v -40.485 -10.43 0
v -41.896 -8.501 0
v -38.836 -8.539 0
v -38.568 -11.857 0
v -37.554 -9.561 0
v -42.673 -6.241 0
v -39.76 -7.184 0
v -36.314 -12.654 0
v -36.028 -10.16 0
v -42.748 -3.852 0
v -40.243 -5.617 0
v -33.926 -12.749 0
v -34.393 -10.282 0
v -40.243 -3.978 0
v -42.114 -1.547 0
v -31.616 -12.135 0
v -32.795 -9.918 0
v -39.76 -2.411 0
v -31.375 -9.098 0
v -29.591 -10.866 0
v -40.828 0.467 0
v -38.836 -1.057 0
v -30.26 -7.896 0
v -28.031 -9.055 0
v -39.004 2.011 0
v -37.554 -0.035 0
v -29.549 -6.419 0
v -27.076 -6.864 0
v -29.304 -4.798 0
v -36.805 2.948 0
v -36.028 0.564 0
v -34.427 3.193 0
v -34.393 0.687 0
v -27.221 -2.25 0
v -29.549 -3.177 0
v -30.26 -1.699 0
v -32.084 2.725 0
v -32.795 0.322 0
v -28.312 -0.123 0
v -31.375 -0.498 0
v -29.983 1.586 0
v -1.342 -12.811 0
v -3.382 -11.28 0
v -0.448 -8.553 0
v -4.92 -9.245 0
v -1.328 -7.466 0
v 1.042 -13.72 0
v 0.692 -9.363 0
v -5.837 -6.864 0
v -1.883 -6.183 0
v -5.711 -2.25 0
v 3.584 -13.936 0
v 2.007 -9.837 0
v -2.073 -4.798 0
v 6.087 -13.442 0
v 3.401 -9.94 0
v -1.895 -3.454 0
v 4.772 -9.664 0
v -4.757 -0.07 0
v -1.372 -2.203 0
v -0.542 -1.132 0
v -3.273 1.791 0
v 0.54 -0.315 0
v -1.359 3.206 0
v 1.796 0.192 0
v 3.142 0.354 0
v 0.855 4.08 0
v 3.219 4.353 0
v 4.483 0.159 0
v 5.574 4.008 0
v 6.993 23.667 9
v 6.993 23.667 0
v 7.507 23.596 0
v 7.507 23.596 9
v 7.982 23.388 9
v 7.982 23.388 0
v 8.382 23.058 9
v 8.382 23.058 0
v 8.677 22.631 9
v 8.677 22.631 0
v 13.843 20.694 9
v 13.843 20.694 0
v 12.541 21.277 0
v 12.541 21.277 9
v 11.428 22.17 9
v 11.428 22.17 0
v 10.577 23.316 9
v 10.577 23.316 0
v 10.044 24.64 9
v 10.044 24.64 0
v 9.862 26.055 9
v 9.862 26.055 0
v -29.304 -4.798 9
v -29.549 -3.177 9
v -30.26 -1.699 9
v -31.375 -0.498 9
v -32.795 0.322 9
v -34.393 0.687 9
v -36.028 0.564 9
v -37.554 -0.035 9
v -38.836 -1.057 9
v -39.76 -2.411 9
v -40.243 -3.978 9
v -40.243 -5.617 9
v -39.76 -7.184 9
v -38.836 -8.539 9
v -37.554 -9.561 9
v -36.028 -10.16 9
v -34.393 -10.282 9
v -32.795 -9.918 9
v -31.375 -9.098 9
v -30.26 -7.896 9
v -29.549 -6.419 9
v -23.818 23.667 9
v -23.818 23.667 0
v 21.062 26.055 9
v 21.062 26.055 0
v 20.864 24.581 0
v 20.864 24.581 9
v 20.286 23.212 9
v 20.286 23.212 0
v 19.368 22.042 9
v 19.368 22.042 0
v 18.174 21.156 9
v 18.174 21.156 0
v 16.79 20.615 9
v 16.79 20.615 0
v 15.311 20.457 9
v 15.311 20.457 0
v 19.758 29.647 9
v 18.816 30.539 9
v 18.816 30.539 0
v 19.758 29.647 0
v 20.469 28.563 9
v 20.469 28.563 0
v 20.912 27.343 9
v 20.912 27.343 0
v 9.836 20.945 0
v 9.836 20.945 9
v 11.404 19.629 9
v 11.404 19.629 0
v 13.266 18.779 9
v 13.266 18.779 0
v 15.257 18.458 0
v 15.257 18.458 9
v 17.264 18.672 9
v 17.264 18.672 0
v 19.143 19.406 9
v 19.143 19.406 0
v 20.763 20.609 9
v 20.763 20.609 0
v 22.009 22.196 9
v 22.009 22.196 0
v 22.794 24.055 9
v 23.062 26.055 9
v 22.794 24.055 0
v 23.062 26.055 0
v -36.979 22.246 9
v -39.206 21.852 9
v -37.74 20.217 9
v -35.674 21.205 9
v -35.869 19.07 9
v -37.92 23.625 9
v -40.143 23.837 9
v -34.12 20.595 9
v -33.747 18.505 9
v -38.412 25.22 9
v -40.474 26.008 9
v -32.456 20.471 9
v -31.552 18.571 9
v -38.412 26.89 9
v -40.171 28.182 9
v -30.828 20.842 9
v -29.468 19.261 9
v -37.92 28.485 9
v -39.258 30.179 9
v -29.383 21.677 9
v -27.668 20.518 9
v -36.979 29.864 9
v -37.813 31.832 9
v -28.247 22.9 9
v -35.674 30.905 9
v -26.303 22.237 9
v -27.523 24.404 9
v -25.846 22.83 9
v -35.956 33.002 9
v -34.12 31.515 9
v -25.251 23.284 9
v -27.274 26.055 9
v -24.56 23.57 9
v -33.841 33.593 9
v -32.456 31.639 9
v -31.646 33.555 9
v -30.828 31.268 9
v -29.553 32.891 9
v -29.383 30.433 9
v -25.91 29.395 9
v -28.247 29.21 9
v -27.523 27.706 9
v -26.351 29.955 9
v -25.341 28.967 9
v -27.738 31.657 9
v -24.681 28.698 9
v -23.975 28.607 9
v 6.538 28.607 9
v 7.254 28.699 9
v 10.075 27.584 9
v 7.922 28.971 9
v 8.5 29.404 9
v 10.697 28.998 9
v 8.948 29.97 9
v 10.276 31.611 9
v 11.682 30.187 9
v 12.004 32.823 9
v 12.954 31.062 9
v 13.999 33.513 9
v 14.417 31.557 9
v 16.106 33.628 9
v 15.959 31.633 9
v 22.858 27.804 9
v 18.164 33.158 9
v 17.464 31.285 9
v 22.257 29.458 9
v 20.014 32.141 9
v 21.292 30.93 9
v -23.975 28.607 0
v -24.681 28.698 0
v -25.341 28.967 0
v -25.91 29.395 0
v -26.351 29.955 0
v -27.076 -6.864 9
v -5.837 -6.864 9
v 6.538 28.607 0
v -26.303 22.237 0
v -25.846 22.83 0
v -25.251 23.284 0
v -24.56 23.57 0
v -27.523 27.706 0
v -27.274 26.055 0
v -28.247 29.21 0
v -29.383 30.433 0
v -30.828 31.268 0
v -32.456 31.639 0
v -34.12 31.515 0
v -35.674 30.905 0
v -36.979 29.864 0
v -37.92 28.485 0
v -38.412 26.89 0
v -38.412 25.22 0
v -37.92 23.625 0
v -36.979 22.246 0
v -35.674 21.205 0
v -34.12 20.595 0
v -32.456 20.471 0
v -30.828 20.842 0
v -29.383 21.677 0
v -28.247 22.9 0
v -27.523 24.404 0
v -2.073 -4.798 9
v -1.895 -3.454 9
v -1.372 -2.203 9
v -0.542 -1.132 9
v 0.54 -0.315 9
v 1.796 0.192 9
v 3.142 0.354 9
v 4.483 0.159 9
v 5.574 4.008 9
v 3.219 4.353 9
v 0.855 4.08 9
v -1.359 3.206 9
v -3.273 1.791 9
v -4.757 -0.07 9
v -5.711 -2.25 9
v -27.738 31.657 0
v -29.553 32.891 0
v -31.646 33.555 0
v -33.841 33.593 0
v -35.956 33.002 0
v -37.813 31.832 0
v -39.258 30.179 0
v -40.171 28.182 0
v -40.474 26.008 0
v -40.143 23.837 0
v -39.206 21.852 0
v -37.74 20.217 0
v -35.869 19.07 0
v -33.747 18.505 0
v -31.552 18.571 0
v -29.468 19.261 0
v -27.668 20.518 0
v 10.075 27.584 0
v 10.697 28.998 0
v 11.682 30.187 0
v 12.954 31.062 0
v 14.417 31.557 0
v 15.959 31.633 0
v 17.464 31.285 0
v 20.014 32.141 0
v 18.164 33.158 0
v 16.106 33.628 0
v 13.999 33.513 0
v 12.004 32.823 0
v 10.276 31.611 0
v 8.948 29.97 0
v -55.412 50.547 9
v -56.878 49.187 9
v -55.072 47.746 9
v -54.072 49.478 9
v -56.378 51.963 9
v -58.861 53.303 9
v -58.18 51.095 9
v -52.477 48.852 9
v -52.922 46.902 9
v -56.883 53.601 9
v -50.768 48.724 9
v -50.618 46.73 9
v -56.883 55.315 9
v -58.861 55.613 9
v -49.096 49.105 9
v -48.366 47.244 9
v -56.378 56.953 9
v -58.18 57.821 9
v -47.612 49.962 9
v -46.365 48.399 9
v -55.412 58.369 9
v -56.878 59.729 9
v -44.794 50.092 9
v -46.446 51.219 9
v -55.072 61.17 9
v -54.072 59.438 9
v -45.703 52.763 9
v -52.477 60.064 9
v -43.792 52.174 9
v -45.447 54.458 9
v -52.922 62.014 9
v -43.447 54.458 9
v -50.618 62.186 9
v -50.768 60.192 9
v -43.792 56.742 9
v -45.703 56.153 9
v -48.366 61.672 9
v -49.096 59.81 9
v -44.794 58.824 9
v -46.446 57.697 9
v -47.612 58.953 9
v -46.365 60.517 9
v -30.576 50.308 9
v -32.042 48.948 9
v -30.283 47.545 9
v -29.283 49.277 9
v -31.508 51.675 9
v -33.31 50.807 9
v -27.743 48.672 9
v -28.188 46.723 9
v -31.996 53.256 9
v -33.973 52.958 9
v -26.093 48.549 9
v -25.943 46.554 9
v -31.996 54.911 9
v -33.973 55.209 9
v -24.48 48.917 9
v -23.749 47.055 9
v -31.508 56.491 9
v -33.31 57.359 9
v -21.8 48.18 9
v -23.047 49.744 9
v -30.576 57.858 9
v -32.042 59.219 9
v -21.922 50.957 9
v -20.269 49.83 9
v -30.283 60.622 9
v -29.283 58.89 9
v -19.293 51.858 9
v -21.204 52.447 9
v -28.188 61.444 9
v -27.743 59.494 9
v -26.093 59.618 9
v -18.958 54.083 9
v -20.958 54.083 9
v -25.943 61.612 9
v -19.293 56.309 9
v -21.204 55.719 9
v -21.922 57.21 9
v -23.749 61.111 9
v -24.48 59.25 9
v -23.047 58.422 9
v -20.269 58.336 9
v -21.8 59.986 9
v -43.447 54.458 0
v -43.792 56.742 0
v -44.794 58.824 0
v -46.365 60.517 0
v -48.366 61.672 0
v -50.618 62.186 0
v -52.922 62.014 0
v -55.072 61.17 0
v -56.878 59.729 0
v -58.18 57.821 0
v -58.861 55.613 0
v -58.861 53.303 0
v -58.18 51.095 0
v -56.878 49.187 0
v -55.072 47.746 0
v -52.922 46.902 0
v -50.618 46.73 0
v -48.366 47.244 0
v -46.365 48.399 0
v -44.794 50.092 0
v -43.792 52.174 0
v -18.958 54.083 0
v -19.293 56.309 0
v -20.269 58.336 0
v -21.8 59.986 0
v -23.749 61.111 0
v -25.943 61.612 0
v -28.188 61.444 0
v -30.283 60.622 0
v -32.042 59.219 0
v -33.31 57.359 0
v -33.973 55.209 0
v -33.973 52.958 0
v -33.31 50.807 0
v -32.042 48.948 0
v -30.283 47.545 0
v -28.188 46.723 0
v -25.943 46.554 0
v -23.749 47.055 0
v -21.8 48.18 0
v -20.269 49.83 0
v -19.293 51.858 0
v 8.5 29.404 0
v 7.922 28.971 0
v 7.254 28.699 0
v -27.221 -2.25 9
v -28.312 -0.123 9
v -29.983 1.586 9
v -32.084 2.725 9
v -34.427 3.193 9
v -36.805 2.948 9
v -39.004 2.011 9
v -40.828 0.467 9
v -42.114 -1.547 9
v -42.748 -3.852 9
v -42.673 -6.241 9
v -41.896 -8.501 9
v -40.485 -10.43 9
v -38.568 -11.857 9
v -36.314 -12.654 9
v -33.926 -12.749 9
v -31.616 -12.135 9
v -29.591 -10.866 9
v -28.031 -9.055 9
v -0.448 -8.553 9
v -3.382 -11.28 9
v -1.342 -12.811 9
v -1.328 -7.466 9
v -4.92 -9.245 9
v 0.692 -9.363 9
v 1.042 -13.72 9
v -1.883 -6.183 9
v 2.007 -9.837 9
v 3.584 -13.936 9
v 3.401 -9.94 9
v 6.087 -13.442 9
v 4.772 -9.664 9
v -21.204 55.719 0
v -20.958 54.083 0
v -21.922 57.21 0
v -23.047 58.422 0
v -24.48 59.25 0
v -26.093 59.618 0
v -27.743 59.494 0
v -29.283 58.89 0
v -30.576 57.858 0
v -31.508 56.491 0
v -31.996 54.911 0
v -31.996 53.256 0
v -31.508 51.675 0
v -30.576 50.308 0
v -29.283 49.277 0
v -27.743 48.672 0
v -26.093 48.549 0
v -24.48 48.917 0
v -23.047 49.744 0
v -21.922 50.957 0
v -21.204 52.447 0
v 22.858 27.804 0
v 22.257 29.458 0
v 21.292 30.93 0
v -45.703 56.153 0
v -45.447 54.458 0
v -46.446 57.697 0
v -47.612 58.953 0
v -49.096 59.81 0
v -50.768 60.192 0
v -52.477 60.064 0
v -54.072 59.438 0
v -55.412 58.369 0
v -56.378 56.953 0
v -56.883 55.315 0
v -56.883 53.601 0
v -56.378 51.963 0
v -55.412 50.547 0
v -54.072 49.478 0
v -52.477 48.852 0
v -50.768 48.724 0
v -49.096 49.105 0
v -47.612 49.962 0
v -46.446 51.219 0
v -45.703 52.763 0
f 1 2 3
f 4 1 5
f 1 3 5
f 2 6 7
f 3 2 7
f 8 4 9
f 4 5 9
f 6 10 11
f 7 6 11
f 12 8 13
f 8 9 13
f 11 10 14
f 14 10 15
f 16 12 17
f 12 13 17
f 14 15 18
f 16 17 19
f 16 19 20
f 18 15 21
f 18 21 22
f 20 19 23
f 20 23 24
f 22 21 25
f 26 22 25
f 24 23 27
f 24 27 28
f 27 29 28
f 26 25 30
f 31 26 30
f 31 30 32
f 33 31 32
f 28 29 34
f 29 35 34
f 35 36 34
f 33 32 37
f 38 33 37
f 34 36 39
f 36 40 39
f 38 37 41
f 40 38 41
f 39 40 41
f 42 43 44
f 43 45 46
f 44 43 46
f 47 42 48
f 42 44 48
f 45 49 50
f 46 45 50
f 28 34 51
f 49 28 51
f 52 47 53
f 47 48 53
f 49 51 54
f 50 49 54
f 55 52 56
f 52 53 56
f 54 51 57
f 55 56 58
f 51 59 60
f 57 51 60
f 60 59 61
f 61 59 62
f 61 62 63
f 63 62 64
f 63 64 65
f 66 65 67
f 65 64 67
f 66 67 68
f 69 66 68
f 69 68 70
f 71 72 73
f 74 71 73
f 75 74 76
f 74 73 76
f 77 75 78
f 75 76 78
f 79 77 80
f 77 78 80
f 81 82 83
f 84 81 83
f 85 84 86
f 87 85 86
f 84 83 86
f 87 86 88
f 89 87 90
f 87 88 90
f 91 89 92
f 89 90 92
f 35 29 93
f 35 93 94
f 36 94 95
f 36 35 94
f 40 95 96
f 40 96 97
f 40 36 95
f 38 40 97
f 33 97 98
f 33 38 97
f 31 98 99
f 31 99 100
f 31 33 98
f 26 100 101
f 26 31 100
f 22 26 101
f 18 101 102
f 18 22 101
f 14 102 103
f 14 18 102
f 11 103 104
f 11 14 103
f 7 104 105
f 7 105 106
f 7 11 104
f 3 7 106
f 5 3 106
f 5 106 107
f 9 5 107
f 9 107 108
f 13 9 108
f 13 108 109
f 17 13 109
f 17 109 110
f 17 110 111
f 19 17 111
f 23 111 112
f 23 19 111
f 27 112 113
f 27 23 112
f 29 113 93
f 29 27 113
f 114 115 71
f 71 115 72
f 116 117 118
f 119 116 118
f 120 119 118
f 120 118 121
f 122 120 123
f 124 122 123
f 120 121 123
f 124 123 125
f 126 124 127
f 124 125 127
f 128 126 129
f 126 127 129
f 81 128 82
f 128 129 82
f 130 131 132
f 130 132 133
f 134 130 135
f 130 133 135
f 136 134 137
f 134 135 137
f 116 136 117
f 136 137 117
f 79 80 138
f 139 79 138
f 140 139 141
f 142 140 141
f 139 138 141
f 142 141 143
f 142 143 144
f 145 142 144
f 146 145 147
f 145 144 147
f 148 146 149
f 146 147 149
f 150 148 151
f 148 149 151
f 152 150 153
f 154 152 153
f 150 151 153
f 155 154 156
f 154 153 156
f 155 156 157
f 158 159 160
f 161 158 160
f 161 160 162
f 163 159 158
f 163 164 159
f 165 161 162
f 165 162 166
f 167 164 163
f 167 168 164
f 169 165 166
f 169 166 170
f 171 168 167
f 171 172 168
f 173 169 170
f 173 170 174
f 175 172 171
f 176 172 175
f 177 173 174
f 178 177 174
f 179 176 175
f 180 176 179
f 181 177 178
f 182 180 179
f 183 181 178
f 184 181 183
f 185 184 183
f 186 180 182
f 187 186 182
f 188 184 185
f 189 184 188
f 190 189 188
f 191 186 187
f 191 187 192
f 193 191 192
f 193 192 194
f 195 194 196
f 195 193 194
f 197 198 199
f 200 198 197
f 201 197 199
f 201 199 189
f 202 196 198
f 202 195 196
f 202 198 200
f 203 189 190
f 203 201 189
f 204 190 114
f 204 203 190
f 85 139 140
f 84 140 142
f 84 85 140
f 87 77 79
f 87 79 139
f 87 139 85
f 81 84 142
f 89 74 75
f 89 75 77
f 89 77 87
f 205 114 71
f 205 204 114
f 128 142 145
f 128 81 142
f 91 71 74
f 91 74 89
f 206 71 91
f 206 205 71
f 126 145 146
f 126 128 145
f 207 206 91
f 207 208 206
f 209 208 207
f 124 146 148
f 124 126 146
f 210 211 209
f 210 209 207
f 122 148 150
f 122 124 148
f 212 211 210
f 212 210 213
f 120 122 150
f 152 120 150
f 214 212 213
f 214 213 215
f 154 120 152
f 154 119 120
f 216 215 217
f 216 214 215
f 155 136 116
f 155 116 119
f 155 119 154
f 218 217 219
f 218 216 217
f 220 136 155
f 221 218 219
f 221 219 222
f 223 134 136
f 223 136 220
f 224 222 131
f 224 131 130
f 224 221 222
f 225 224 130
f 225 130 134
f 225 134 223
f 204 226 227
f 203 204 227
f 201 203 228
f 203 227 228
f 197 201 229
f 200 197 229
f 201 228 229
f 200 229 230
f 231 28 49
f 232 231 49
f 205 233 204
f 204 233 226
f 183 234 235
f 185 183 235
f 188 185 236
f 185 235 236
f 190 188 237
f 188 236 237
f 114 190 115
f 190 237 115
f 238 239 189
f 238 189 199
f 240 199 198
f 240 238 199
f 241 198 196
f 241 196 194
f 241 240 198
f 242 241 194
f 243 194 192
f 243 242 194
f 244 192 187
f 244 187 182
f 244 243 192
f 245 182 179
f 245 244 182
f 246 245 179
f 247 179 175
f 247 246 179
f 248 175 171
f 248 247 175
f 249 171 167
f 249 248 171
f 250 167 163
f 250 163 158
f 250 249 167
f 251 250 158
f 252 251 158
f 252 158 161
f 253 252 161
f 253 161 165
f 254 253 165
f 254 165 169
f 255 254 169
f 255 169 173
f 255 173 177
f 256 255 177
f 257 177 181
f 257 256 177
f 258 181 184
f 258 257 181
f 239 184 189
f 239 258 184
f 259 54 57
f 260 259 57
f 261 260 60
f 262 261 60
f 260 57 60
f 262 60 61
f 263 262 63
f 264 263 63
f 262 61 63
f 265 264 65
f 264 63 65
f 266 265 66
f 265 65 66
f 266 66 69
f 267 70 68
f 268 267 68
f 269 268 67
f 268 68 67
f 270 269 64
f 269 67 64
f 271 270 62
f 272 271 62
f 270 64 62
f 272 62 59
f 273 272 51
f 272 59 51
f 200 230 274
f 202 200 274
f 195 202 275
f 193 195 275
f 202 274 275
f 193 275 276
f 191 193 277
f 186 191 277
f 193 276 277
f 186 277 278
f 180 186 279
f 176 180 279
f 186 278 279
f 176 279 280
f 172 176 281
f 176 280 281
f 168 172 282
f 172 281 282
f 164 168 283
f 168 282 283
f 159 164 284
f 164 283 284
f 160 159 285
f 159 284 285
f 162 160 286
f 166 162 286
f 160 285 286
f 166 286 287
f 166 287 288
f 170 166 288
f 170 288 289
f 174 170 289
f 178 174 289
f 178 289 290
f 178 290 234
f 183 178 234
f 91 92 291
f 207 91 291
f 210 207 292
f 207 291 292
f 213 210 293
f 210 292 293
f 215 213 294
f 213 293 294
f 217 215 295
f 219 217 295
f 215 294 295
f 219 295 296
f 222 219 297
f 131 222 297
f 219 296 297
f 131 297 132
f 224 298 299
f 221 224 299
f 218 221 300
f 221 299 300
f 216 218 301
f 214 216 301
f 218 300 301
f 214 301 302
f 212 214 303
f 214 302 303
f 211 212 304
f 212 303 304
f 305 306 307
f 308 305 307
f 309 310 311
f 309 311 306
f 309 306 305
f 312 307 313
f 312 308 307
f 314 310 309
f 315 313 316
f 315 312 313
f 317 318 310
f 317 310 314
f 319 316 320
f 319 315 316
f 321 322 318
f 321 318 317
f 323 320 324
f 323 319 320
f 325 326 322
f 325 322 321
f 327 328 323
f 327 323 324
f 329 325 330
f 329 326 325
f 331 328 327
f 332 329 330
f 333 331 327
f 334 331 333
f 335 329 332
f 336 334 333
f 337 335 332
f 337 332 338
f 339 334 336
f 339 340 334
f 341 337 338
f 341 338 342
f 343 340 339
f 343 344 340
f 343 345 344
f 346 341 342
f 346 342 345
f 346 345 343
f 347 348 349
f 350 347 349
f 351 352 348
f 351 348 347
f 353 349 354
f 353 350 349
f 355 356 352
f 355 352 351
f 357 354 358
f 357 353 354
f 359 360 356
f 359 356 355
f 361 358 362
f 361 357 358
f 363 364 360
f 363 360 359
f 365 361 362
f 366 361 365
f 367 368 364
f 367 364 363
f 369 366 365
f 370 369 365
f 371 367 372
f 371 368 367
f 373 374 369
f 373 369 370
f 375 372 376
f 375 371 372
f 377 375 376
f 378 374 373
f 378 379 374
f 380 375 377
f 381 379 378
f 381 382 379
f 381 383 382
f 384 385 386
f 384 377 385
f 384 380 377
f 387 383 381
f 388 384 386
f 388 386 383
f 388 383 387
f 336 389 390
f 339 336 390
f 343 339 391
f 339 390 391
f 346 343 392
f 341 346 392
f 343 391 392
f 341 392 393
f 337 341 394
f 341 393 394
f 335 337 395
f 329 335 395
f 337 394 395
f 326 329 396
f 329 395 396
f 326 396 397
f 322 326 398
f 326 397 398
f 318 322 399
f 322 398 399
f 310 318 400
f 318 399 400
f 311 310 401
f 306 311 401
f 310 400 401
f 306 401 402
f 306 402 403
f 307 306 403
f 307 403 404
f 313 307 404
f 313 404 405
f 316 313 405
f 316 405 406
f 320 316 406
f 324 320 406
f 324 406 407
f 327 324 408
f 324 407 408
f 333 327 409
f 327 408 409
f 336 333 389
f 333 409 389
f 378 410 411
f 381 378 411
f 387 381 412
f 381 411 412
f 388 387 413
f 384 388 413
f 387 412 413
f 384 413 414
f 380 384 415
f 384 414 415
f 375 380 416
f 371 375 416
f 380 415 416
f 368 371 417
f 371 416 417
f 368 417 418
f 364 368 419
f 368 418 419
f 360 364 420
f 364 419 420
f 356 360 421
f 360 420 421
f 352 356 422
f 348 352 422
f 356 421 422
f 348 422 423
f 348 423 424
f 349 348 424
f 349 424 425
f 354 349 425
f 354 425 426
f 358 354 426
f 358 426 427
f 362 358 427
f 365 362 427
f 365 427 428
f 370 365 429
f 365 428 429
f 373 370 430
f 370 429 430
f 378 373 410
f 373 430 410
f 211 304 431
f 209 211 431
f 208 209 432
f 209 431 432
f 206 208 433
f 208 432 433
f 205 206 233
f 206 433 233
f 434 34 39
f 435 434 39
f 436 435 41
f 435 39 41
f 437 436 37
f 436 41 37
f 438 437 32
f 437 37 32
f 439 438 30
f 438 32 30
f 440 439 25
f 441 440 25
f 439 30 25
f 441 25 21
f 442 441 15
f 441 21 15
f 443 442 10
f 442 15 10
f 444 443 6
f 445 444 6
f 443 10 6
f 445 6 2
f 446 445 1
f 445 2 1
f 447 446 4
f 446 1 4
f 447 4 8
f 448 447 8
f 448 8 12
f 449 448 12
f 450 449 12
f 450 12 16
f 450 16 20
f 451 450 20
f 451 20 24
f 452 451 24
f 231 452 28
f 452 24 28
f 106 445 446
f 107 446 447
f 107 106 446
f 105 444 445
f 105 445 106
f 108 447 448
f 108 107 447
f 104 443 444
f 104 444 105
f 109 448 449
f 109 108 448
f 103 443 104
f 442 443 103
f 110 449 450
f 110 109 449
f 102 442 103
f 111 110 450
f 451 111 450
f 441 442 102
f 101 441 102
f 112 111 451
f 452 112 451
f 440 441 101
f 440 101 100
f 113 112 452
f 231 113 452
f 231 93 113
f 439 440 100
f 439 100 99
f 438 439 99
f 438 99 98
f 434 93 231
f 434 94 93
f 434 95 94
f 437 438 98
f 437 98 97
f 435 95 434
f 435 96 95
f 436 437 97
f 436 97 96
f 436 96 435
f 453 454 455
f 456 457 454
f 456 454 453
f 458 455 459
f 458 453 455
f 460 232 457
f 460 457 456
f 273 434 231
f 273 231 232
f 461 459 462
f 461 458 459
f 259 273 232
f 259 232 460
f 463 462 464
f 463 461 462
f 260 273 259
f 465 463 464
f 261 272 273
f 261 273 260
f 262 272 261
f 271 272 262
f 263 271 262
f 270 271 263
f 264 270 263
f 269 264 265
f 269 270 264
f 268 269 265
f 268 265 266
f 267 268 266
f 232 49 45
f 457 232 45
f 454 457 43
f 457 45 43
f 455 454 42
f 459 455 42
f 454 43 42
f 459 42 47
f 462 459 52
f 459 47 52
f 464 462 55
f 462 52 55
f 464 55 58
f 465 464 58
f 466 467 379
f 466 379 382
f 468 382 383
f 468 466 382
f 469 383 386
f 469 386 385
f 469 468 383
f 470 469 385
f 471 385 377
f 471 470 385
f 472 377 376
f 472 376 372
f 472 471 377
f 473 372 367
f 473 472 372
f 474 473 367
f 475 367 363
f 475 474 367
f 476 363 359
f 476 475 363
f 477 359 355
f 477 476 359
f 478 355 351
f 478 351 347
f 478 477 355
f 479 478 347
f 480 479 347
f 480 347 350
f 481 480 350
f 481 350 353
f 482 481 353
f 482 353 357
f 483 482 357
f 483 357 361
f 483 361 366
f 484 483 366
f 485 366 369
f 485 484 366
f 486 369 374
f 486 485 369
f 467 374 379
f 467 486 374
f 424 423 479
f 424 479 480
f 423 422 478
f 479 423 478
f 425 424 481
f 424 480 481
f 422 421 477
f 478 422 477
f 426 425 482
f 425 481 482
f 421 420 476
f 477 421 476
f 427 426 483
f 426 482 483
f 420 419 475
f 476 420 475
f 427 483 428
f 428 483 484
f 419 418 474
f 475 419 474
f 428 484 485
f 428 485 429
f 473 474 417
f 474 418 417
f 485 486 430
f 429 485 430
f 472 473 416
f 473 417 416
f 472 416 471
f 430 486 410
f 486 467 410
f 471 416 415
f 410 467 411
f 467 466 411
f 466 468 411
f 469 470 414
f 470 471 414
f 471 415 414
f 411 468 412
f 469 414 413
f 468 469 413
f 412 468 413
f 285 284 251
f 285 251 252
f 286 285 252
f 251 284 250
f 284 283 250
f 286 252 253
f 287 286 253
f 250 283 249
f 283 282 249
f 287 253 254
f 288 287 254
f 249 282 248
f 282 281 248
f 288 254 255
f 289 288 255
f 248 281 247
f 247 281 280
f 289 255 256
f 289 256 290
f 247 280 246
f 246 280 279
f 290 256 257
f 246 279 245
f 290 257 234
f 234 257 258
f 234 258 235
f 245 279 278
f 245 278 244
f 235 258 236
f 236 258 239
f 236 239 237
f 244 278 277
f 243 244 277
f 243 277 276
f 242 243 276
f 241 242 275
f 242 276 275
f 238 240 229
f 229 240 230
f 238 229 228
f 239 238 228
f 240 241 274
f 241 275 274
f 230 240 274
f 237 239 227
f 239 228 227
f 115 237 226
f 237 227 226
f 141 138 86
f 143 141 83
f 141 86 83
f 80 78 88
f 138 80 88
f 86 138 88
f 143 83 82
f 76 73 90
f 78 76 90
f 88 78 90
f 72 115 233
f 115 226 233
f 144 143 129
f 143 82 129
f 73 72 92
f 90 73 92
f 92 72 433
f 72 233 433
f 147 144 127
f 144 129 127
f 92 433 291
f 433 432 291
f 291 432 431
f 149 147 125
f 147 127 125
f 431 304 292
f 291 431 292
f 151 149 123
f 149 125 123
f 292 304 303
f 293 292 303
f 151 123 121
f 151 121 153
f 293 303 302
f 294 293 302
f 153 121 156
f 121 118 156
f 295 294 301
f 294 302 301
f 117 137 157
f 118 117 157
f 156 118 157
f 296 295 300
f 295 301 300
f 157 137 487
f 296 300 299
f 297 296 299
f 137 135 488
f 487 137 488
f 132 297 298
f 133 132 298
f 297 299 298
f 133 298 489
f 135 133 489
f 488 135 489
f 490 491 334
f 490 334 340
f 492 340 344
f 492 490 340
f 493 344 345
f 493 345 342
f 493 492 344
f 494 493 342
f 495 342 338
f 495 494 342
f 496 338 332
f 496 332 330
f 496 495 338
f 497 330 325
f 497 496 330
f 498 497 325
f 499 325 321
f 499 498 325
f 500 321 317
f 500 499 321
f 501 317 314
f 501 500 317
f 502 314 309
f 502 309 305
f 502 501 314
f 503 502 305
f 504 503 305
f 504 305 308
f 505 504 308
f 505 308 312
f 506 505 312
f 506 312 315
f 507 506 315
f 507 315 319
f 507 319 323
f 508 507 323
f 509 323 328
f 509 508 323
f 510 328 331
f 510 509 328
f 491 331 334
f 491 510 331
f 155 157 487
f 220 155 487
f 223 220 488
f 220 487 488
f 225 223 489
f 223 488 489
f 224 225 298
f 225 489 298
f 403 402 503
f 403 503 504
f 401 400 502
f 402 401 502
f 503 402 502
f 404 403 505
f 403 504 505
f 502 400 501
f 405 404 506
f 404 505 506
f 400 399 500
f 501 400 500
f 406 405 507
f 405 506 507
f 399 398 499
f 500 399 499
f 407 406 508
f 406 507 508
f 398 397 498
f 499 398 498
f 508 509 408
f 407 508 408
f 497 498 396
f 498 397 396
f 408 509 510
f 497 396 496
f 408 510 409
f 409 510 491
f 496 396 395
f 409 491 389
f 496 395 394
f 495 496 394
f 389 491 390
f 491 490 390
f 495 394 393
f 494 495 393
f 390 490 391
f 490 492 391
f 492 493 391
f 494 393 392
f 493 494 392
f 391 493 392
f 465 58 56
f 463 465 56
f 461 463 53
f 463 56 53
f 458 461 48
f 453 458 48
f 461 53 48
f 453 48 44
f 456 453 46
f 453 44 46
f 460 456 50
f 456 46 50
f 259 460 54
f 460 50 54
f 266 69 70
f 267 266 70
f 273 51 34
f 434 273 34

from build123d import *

# Parameters (mm, degrees)
F0_R     = 5.6
F1_DEPTH = 9
F0_R_2   = 5.5
F2_R     = 7.75
F2_R_2   = 5.75
F3_DEPTH = 9
F2_R_3   = 7.55
F2_R_4   = 5.55


with BuildPart() as f1:
    # F0 (on Top) → F1 (new body)
    with BuildSketch(Plane.XY):
        with BuildLine():
            ThreePointArc((-25.6589871965, 23.6674857575), (-25.3710249477, 24.845867098), (-25.2742154187, 26.0550539139))
            ThreePointArc((-25.2742154187, 26.0550539139), (-25.3853205074, 27.3498330484), (-25.7153872627, 28.6067551958))
            ThreePointArc((-25.7153872627, 28.6067551958), (-26.0000307004, 29.2962858493), (-26.3509017676, 29.9545896567))
            ThreePointArc((-26.3509017676, 29.9545896567), (-40.474067426, 26.007625361), (-26.3027399391, 22.2372390912))
            ThreePointArc((-26.3027399391, 22.2372390912), (-25.9438690261, 22.9357112143), (-25.6589871965, 23.6674857575))
        make_face()
        with Locations((-32.8742154187, 26.0550539139)):
            Circle(F0_R, mode=Mode.SUBTRACT)
        with BuildLine():
            Line((7.861747735, 26.0550539139), (-25.2742154187, 26.0550539139))
            ThreePointArc((-25.2742154187, 26.0550539139), (-25.3710249477, 24.845867098), (-25.6589871965, 23.6674857575))
            Line((-25.6589871965, 23.6674857575), (-23.8177132642, 23.6674857575))
            Line((-23.8177132642, 23.6674857575), (6.9932735761, 23.6674857575))
            Line((6.9932735761, 23.6674857575), (8.2465195128, 23.6674857575))
            ThreePointArc((8.2465195128, 23.6674857575), (7.958557264, 24.845867098), (7.861747735, 26.0550539139))
        make_face()
        with BuildLine():
            ThreePointArc((-25.7153872627, 28.6067551958), (-25.3853205074, 27.3498330484), (-25.2742154187, 26.0550539139))
            Line((-25.2742154187, 26.0550539139), (7.861747735, 26.0550539139))
            ThreePointArc((7.861747735, 26.0550539139), (7.9728528237, 27.3498330484), (8.3029195789, 28.6067551958))
            Line((8.3029195789, 28.6067551958), (6.5379139452, 28.6067551958))
            Line((6.5379139452, 28.6067551958), (-23.9748898894, 28.6067551958))
            Line((-23.9748898894, 28.6067551958), (-25.7153872627, 28.6067551958))
        make_face()
        with BuildLine():
            Line((9.861747735, 26.0550539139), (7.861747735, 26.0550539139))
            ThreePointArc((7.861747735, 26.0550539139), (7.958557264, 24.845867098), (8.2465195128, 23.6674857575))
            ThreePointArc((8.2465195128, 23.6674857575), (8.4424045926, 23.1414956341), (8.6765748147, 22.6313967404))
            ThreePointArc((8.6765748147, 22.6313967404), (10.5754372974, 20.2340599861), (13.2655252622, 18.7792991867))
            Line((13.2655252622, 18.7792991867), (13.8434785445, 20.6939714834))
            ThreePointArc((13.8434785445, 20.6939714834), (10.9660660588, 22.7160651049), (9.861747735, 26.0550539139))
        make_face()
        with BuildLine():
            ThreePointArc((8.3029195789, 28.6067551958), (7.9728528237, 27.3498330484), (7.861747735, 26.0550539139))
            Line((7.861747735, 26.0550539139), (9.861747735, 26.0550539139))
            ThreePointArc((9.861747735, 26.0550539139), (12.9541525991, 31.0622454056), (18.816021533, 30.5393428528))
            Line((18.816021533, 30.5393428528), (20.0139764609, 32.1408746167))
            ThreePointArc((20.0139764609, 32.1408746167), (13.9987226688, 33.5129059945), (8.947650731, 29.9699664574))
            ThreePointArc((8.947650731, 29.9699664574), (8.5913906232, 29.304391255), (8.3029195789, 28.6067551958))
        make_face()
        with BuildLine():
            Line((20.0139764609, 32.1408746167), (18.816021533, 30.5393428528))
            ThreePointArc((18.816021533, 30.5393428528), (20.4689392267, 28.5626490498), (21.061747735, 26.0550539139))
            ThreePointArc((21.061747735, 26.0550539139), (18.800736544, 21.5593722377), (13.8434785445, 20.6939714834))
            Line((13.8434785445, 20.6939714834), (13.2655252622, 18.7792991867))
            ThreePointArc((13.2655252622, 18.7792991867), (19.9932325472, 19.9537716391), (23.061747735, 26.0550539139))
            ThreePointArc((23.061747735, 26.0550539139), (22.2572219023, 29.4582187412), (20.0139764609, 32.1408746167))
        make_face()
        with BuildLine():
            ThreePointArc((-26.3509017676, 29.9545896567), (-26.0000307004, 29.2962858493), (-25.7153872627, 28.6067551958))
            Line((-25.7153872627, 28.6067551958), (-23.9748898894, 28.6067551958))
            ThreePointArc((-23.9748898894, 28.6067551958), (-25.3407312216, 28.9671776918), (-26.3509017676, 29.9545896567))
        make_face()
        with BuildLine():
            Line((-23.8177132642, 23.6674857575), (-25.6589871965, 23.6674857575))
            ThreePointArc((-25.6589871965, 23.6674857575), (-25.9438690261, 22.9357112143), (-26.3027399391, 22.2372390912))
            ThreePointArc((-26.3027399391, 22.2372390912), (-25.2513243605, 23.2843911851), (-23.8177132642, 23.6674857575))
        make_face()
        with BuildLine():
            Line((6.5379139452, 28.6067551958), (8.3029195789, 28.6067551958))
            ThreePointArc((8.3029195789, 28.6067551958), (8.5913906232, 29.304391255), (8.947650731, 29.9699664574))
            ThreePointArc((8.947650731, 29.9699664574), (7.9222166861, 28.9711762777), (6.5379139452, 28.6067551958))
        make_face()
        with BuildLine():
            ThreePointArc((8.6765748147, 22.6313967404), (8.4424045926, 23.1414956341), (8.2465195128, 23.6674857575))
            Line((8.2465195128, 23.6674857575), (6.9932735761, 23.6674857575))
            ThreePointArc((6.9932735761, 23.6674857575), (7.9815781239, 23.3877052739), (8.6765748147, 22.6313967404))
        make_face()
    extrude(amount=F1_DEPTH)


with BuildPart() as f1b:
    # F0 (on Top) → F1, piece 2 (new body)
    with BuildSketch(Plane.XY):
        with BuildLine():
            ThreePointArc((-27.0758371224, -6.864185135), (-26.8725005831, -5.8398261755), (-26.8043345189, -4.7977079413))
            ThreePointArc((-26.8043345189, -4.7977079413), (-26.9091577828, -3.5069003239), (-27.2208805952, -2.2499193733))
            ThreePointArc((-27.2208805952, -2.2499193733), (-42.800385134, -5.0490534445), (-27.0758371224, -6.864185135))
        make_face()
        with Locations((-34.8043345189, -4.7977079413)):
            Circle(F0_R_2, mode=Mode.SUBTRACT)
        with BuildLine():
            ThreePointArc((-27.2208805952, -2.2499193733), (-26.9091577828, -3.5069003239), (-26.8043345189, -4.7977079413))
            Line((-26.8043345189, -4.7977079413), (-6.0729504156, -4.7977079413))
            ThreePointArc((-6.0729504156, -4.7977079413), (-5.9820544851, -3.5110348984), (-5.7111721829, -2.2499193733))
            Line((-5.7111721829, -2.2499193733), (-27.2208805952, -2.2499193733))
        make_face()
        with BuildLine():
            Line((-6.0729504156, -4.7977079413), (-26.8043345189, -4.7977079413))
            ThreePointArc((-26.8043345189, -4.7977079413), (-26.8725005831, -5.8398261755), (-27.0758371224, -6.864185135))
            Line((-27.0758371224, -6.864185135), (-5.8366026775, -6.864185135))
            ThreePointArc((-5.8366026775, -6.864185135), (-6.0136715053, -5.8376824897), (-6.0729504156, -4.7977079413))
        make_face()
        with BuildLine():
            Line((-2.0729504156, -4.7977079413), (-6.0729504156, -4.7977079413))
            ThreePointArc((-6.0729504156, -4.7977079413), (-6.0136715053, -5.8376824897), (-5.8366026775, -6.864185135))
            ThreePointArc((-5.8366026775, -6.864185135), (-1.3415298691, -12.8113942196), (6.0866439305, -13.4416397683))
            Line((6.0866439305, -13.4416397683), (4.7722332653, -9.663766742))
            ThreePointArc((4.7722332653, -9.663766742), (0.0940766118, -8.9969658482), (-2.0729504156, -4.7977079413))
        make_face()
        with BuildLine():
            ThreePointArc((-5.7111721829, -2.2499193733), (-5.9820544851, -3.5110348984), (-6.0729504156, -4.7977079413))
            Line((-6.0729504156, -4.7977079413), (-2.0729504156, -4.7977079413))
            ThreePointArc((-2.0729504156, -4.7977079413), (-0.0280371107, -0.6879875201), (4.4834363629, 0.159408173))
            Line((4.4834363629, 0.159408173), (5.5736331269, 4.0079755709))
            ThreePointArc((5.5736331269, 4.0079755709), (-1.3592659448, 3.2061686063), (-5.7111721829, -2.2499193733))
        make_face()
    extrude(amount=F1_DEPTH)


with BuildPart() as f3:
    # F2 (on Top) → F3 (new body)
    with BuildSketch(Plane.XY):
        with Locations((-51.1972010136, 54.4579364359)):
            Circle(F2_R)
        with Locations((-51.1972010136, 54.4579364359)):
            Circle(F2_R_2, mode=Mode.SUBTRACT)
    extrude(amount=F3_DEPTH)


with BuildPart() as f3b:
    # F2 (on Top) → F3, piece 2 (new body)
    with BuildSketch(Plane.XY):
        with Locations((-26.5075825155, 54.0833212435)):
            Circle(F2_R_3)
        with Locations((-26.5075825155, 54.0833212435)):
            Circle(F2_R_4, mode=Mode.SUBTRACT)
    extrude(amount=F3_DEPTH)


solid = Compound([f1.part, f1b.part, f3.part, f3b.part])
